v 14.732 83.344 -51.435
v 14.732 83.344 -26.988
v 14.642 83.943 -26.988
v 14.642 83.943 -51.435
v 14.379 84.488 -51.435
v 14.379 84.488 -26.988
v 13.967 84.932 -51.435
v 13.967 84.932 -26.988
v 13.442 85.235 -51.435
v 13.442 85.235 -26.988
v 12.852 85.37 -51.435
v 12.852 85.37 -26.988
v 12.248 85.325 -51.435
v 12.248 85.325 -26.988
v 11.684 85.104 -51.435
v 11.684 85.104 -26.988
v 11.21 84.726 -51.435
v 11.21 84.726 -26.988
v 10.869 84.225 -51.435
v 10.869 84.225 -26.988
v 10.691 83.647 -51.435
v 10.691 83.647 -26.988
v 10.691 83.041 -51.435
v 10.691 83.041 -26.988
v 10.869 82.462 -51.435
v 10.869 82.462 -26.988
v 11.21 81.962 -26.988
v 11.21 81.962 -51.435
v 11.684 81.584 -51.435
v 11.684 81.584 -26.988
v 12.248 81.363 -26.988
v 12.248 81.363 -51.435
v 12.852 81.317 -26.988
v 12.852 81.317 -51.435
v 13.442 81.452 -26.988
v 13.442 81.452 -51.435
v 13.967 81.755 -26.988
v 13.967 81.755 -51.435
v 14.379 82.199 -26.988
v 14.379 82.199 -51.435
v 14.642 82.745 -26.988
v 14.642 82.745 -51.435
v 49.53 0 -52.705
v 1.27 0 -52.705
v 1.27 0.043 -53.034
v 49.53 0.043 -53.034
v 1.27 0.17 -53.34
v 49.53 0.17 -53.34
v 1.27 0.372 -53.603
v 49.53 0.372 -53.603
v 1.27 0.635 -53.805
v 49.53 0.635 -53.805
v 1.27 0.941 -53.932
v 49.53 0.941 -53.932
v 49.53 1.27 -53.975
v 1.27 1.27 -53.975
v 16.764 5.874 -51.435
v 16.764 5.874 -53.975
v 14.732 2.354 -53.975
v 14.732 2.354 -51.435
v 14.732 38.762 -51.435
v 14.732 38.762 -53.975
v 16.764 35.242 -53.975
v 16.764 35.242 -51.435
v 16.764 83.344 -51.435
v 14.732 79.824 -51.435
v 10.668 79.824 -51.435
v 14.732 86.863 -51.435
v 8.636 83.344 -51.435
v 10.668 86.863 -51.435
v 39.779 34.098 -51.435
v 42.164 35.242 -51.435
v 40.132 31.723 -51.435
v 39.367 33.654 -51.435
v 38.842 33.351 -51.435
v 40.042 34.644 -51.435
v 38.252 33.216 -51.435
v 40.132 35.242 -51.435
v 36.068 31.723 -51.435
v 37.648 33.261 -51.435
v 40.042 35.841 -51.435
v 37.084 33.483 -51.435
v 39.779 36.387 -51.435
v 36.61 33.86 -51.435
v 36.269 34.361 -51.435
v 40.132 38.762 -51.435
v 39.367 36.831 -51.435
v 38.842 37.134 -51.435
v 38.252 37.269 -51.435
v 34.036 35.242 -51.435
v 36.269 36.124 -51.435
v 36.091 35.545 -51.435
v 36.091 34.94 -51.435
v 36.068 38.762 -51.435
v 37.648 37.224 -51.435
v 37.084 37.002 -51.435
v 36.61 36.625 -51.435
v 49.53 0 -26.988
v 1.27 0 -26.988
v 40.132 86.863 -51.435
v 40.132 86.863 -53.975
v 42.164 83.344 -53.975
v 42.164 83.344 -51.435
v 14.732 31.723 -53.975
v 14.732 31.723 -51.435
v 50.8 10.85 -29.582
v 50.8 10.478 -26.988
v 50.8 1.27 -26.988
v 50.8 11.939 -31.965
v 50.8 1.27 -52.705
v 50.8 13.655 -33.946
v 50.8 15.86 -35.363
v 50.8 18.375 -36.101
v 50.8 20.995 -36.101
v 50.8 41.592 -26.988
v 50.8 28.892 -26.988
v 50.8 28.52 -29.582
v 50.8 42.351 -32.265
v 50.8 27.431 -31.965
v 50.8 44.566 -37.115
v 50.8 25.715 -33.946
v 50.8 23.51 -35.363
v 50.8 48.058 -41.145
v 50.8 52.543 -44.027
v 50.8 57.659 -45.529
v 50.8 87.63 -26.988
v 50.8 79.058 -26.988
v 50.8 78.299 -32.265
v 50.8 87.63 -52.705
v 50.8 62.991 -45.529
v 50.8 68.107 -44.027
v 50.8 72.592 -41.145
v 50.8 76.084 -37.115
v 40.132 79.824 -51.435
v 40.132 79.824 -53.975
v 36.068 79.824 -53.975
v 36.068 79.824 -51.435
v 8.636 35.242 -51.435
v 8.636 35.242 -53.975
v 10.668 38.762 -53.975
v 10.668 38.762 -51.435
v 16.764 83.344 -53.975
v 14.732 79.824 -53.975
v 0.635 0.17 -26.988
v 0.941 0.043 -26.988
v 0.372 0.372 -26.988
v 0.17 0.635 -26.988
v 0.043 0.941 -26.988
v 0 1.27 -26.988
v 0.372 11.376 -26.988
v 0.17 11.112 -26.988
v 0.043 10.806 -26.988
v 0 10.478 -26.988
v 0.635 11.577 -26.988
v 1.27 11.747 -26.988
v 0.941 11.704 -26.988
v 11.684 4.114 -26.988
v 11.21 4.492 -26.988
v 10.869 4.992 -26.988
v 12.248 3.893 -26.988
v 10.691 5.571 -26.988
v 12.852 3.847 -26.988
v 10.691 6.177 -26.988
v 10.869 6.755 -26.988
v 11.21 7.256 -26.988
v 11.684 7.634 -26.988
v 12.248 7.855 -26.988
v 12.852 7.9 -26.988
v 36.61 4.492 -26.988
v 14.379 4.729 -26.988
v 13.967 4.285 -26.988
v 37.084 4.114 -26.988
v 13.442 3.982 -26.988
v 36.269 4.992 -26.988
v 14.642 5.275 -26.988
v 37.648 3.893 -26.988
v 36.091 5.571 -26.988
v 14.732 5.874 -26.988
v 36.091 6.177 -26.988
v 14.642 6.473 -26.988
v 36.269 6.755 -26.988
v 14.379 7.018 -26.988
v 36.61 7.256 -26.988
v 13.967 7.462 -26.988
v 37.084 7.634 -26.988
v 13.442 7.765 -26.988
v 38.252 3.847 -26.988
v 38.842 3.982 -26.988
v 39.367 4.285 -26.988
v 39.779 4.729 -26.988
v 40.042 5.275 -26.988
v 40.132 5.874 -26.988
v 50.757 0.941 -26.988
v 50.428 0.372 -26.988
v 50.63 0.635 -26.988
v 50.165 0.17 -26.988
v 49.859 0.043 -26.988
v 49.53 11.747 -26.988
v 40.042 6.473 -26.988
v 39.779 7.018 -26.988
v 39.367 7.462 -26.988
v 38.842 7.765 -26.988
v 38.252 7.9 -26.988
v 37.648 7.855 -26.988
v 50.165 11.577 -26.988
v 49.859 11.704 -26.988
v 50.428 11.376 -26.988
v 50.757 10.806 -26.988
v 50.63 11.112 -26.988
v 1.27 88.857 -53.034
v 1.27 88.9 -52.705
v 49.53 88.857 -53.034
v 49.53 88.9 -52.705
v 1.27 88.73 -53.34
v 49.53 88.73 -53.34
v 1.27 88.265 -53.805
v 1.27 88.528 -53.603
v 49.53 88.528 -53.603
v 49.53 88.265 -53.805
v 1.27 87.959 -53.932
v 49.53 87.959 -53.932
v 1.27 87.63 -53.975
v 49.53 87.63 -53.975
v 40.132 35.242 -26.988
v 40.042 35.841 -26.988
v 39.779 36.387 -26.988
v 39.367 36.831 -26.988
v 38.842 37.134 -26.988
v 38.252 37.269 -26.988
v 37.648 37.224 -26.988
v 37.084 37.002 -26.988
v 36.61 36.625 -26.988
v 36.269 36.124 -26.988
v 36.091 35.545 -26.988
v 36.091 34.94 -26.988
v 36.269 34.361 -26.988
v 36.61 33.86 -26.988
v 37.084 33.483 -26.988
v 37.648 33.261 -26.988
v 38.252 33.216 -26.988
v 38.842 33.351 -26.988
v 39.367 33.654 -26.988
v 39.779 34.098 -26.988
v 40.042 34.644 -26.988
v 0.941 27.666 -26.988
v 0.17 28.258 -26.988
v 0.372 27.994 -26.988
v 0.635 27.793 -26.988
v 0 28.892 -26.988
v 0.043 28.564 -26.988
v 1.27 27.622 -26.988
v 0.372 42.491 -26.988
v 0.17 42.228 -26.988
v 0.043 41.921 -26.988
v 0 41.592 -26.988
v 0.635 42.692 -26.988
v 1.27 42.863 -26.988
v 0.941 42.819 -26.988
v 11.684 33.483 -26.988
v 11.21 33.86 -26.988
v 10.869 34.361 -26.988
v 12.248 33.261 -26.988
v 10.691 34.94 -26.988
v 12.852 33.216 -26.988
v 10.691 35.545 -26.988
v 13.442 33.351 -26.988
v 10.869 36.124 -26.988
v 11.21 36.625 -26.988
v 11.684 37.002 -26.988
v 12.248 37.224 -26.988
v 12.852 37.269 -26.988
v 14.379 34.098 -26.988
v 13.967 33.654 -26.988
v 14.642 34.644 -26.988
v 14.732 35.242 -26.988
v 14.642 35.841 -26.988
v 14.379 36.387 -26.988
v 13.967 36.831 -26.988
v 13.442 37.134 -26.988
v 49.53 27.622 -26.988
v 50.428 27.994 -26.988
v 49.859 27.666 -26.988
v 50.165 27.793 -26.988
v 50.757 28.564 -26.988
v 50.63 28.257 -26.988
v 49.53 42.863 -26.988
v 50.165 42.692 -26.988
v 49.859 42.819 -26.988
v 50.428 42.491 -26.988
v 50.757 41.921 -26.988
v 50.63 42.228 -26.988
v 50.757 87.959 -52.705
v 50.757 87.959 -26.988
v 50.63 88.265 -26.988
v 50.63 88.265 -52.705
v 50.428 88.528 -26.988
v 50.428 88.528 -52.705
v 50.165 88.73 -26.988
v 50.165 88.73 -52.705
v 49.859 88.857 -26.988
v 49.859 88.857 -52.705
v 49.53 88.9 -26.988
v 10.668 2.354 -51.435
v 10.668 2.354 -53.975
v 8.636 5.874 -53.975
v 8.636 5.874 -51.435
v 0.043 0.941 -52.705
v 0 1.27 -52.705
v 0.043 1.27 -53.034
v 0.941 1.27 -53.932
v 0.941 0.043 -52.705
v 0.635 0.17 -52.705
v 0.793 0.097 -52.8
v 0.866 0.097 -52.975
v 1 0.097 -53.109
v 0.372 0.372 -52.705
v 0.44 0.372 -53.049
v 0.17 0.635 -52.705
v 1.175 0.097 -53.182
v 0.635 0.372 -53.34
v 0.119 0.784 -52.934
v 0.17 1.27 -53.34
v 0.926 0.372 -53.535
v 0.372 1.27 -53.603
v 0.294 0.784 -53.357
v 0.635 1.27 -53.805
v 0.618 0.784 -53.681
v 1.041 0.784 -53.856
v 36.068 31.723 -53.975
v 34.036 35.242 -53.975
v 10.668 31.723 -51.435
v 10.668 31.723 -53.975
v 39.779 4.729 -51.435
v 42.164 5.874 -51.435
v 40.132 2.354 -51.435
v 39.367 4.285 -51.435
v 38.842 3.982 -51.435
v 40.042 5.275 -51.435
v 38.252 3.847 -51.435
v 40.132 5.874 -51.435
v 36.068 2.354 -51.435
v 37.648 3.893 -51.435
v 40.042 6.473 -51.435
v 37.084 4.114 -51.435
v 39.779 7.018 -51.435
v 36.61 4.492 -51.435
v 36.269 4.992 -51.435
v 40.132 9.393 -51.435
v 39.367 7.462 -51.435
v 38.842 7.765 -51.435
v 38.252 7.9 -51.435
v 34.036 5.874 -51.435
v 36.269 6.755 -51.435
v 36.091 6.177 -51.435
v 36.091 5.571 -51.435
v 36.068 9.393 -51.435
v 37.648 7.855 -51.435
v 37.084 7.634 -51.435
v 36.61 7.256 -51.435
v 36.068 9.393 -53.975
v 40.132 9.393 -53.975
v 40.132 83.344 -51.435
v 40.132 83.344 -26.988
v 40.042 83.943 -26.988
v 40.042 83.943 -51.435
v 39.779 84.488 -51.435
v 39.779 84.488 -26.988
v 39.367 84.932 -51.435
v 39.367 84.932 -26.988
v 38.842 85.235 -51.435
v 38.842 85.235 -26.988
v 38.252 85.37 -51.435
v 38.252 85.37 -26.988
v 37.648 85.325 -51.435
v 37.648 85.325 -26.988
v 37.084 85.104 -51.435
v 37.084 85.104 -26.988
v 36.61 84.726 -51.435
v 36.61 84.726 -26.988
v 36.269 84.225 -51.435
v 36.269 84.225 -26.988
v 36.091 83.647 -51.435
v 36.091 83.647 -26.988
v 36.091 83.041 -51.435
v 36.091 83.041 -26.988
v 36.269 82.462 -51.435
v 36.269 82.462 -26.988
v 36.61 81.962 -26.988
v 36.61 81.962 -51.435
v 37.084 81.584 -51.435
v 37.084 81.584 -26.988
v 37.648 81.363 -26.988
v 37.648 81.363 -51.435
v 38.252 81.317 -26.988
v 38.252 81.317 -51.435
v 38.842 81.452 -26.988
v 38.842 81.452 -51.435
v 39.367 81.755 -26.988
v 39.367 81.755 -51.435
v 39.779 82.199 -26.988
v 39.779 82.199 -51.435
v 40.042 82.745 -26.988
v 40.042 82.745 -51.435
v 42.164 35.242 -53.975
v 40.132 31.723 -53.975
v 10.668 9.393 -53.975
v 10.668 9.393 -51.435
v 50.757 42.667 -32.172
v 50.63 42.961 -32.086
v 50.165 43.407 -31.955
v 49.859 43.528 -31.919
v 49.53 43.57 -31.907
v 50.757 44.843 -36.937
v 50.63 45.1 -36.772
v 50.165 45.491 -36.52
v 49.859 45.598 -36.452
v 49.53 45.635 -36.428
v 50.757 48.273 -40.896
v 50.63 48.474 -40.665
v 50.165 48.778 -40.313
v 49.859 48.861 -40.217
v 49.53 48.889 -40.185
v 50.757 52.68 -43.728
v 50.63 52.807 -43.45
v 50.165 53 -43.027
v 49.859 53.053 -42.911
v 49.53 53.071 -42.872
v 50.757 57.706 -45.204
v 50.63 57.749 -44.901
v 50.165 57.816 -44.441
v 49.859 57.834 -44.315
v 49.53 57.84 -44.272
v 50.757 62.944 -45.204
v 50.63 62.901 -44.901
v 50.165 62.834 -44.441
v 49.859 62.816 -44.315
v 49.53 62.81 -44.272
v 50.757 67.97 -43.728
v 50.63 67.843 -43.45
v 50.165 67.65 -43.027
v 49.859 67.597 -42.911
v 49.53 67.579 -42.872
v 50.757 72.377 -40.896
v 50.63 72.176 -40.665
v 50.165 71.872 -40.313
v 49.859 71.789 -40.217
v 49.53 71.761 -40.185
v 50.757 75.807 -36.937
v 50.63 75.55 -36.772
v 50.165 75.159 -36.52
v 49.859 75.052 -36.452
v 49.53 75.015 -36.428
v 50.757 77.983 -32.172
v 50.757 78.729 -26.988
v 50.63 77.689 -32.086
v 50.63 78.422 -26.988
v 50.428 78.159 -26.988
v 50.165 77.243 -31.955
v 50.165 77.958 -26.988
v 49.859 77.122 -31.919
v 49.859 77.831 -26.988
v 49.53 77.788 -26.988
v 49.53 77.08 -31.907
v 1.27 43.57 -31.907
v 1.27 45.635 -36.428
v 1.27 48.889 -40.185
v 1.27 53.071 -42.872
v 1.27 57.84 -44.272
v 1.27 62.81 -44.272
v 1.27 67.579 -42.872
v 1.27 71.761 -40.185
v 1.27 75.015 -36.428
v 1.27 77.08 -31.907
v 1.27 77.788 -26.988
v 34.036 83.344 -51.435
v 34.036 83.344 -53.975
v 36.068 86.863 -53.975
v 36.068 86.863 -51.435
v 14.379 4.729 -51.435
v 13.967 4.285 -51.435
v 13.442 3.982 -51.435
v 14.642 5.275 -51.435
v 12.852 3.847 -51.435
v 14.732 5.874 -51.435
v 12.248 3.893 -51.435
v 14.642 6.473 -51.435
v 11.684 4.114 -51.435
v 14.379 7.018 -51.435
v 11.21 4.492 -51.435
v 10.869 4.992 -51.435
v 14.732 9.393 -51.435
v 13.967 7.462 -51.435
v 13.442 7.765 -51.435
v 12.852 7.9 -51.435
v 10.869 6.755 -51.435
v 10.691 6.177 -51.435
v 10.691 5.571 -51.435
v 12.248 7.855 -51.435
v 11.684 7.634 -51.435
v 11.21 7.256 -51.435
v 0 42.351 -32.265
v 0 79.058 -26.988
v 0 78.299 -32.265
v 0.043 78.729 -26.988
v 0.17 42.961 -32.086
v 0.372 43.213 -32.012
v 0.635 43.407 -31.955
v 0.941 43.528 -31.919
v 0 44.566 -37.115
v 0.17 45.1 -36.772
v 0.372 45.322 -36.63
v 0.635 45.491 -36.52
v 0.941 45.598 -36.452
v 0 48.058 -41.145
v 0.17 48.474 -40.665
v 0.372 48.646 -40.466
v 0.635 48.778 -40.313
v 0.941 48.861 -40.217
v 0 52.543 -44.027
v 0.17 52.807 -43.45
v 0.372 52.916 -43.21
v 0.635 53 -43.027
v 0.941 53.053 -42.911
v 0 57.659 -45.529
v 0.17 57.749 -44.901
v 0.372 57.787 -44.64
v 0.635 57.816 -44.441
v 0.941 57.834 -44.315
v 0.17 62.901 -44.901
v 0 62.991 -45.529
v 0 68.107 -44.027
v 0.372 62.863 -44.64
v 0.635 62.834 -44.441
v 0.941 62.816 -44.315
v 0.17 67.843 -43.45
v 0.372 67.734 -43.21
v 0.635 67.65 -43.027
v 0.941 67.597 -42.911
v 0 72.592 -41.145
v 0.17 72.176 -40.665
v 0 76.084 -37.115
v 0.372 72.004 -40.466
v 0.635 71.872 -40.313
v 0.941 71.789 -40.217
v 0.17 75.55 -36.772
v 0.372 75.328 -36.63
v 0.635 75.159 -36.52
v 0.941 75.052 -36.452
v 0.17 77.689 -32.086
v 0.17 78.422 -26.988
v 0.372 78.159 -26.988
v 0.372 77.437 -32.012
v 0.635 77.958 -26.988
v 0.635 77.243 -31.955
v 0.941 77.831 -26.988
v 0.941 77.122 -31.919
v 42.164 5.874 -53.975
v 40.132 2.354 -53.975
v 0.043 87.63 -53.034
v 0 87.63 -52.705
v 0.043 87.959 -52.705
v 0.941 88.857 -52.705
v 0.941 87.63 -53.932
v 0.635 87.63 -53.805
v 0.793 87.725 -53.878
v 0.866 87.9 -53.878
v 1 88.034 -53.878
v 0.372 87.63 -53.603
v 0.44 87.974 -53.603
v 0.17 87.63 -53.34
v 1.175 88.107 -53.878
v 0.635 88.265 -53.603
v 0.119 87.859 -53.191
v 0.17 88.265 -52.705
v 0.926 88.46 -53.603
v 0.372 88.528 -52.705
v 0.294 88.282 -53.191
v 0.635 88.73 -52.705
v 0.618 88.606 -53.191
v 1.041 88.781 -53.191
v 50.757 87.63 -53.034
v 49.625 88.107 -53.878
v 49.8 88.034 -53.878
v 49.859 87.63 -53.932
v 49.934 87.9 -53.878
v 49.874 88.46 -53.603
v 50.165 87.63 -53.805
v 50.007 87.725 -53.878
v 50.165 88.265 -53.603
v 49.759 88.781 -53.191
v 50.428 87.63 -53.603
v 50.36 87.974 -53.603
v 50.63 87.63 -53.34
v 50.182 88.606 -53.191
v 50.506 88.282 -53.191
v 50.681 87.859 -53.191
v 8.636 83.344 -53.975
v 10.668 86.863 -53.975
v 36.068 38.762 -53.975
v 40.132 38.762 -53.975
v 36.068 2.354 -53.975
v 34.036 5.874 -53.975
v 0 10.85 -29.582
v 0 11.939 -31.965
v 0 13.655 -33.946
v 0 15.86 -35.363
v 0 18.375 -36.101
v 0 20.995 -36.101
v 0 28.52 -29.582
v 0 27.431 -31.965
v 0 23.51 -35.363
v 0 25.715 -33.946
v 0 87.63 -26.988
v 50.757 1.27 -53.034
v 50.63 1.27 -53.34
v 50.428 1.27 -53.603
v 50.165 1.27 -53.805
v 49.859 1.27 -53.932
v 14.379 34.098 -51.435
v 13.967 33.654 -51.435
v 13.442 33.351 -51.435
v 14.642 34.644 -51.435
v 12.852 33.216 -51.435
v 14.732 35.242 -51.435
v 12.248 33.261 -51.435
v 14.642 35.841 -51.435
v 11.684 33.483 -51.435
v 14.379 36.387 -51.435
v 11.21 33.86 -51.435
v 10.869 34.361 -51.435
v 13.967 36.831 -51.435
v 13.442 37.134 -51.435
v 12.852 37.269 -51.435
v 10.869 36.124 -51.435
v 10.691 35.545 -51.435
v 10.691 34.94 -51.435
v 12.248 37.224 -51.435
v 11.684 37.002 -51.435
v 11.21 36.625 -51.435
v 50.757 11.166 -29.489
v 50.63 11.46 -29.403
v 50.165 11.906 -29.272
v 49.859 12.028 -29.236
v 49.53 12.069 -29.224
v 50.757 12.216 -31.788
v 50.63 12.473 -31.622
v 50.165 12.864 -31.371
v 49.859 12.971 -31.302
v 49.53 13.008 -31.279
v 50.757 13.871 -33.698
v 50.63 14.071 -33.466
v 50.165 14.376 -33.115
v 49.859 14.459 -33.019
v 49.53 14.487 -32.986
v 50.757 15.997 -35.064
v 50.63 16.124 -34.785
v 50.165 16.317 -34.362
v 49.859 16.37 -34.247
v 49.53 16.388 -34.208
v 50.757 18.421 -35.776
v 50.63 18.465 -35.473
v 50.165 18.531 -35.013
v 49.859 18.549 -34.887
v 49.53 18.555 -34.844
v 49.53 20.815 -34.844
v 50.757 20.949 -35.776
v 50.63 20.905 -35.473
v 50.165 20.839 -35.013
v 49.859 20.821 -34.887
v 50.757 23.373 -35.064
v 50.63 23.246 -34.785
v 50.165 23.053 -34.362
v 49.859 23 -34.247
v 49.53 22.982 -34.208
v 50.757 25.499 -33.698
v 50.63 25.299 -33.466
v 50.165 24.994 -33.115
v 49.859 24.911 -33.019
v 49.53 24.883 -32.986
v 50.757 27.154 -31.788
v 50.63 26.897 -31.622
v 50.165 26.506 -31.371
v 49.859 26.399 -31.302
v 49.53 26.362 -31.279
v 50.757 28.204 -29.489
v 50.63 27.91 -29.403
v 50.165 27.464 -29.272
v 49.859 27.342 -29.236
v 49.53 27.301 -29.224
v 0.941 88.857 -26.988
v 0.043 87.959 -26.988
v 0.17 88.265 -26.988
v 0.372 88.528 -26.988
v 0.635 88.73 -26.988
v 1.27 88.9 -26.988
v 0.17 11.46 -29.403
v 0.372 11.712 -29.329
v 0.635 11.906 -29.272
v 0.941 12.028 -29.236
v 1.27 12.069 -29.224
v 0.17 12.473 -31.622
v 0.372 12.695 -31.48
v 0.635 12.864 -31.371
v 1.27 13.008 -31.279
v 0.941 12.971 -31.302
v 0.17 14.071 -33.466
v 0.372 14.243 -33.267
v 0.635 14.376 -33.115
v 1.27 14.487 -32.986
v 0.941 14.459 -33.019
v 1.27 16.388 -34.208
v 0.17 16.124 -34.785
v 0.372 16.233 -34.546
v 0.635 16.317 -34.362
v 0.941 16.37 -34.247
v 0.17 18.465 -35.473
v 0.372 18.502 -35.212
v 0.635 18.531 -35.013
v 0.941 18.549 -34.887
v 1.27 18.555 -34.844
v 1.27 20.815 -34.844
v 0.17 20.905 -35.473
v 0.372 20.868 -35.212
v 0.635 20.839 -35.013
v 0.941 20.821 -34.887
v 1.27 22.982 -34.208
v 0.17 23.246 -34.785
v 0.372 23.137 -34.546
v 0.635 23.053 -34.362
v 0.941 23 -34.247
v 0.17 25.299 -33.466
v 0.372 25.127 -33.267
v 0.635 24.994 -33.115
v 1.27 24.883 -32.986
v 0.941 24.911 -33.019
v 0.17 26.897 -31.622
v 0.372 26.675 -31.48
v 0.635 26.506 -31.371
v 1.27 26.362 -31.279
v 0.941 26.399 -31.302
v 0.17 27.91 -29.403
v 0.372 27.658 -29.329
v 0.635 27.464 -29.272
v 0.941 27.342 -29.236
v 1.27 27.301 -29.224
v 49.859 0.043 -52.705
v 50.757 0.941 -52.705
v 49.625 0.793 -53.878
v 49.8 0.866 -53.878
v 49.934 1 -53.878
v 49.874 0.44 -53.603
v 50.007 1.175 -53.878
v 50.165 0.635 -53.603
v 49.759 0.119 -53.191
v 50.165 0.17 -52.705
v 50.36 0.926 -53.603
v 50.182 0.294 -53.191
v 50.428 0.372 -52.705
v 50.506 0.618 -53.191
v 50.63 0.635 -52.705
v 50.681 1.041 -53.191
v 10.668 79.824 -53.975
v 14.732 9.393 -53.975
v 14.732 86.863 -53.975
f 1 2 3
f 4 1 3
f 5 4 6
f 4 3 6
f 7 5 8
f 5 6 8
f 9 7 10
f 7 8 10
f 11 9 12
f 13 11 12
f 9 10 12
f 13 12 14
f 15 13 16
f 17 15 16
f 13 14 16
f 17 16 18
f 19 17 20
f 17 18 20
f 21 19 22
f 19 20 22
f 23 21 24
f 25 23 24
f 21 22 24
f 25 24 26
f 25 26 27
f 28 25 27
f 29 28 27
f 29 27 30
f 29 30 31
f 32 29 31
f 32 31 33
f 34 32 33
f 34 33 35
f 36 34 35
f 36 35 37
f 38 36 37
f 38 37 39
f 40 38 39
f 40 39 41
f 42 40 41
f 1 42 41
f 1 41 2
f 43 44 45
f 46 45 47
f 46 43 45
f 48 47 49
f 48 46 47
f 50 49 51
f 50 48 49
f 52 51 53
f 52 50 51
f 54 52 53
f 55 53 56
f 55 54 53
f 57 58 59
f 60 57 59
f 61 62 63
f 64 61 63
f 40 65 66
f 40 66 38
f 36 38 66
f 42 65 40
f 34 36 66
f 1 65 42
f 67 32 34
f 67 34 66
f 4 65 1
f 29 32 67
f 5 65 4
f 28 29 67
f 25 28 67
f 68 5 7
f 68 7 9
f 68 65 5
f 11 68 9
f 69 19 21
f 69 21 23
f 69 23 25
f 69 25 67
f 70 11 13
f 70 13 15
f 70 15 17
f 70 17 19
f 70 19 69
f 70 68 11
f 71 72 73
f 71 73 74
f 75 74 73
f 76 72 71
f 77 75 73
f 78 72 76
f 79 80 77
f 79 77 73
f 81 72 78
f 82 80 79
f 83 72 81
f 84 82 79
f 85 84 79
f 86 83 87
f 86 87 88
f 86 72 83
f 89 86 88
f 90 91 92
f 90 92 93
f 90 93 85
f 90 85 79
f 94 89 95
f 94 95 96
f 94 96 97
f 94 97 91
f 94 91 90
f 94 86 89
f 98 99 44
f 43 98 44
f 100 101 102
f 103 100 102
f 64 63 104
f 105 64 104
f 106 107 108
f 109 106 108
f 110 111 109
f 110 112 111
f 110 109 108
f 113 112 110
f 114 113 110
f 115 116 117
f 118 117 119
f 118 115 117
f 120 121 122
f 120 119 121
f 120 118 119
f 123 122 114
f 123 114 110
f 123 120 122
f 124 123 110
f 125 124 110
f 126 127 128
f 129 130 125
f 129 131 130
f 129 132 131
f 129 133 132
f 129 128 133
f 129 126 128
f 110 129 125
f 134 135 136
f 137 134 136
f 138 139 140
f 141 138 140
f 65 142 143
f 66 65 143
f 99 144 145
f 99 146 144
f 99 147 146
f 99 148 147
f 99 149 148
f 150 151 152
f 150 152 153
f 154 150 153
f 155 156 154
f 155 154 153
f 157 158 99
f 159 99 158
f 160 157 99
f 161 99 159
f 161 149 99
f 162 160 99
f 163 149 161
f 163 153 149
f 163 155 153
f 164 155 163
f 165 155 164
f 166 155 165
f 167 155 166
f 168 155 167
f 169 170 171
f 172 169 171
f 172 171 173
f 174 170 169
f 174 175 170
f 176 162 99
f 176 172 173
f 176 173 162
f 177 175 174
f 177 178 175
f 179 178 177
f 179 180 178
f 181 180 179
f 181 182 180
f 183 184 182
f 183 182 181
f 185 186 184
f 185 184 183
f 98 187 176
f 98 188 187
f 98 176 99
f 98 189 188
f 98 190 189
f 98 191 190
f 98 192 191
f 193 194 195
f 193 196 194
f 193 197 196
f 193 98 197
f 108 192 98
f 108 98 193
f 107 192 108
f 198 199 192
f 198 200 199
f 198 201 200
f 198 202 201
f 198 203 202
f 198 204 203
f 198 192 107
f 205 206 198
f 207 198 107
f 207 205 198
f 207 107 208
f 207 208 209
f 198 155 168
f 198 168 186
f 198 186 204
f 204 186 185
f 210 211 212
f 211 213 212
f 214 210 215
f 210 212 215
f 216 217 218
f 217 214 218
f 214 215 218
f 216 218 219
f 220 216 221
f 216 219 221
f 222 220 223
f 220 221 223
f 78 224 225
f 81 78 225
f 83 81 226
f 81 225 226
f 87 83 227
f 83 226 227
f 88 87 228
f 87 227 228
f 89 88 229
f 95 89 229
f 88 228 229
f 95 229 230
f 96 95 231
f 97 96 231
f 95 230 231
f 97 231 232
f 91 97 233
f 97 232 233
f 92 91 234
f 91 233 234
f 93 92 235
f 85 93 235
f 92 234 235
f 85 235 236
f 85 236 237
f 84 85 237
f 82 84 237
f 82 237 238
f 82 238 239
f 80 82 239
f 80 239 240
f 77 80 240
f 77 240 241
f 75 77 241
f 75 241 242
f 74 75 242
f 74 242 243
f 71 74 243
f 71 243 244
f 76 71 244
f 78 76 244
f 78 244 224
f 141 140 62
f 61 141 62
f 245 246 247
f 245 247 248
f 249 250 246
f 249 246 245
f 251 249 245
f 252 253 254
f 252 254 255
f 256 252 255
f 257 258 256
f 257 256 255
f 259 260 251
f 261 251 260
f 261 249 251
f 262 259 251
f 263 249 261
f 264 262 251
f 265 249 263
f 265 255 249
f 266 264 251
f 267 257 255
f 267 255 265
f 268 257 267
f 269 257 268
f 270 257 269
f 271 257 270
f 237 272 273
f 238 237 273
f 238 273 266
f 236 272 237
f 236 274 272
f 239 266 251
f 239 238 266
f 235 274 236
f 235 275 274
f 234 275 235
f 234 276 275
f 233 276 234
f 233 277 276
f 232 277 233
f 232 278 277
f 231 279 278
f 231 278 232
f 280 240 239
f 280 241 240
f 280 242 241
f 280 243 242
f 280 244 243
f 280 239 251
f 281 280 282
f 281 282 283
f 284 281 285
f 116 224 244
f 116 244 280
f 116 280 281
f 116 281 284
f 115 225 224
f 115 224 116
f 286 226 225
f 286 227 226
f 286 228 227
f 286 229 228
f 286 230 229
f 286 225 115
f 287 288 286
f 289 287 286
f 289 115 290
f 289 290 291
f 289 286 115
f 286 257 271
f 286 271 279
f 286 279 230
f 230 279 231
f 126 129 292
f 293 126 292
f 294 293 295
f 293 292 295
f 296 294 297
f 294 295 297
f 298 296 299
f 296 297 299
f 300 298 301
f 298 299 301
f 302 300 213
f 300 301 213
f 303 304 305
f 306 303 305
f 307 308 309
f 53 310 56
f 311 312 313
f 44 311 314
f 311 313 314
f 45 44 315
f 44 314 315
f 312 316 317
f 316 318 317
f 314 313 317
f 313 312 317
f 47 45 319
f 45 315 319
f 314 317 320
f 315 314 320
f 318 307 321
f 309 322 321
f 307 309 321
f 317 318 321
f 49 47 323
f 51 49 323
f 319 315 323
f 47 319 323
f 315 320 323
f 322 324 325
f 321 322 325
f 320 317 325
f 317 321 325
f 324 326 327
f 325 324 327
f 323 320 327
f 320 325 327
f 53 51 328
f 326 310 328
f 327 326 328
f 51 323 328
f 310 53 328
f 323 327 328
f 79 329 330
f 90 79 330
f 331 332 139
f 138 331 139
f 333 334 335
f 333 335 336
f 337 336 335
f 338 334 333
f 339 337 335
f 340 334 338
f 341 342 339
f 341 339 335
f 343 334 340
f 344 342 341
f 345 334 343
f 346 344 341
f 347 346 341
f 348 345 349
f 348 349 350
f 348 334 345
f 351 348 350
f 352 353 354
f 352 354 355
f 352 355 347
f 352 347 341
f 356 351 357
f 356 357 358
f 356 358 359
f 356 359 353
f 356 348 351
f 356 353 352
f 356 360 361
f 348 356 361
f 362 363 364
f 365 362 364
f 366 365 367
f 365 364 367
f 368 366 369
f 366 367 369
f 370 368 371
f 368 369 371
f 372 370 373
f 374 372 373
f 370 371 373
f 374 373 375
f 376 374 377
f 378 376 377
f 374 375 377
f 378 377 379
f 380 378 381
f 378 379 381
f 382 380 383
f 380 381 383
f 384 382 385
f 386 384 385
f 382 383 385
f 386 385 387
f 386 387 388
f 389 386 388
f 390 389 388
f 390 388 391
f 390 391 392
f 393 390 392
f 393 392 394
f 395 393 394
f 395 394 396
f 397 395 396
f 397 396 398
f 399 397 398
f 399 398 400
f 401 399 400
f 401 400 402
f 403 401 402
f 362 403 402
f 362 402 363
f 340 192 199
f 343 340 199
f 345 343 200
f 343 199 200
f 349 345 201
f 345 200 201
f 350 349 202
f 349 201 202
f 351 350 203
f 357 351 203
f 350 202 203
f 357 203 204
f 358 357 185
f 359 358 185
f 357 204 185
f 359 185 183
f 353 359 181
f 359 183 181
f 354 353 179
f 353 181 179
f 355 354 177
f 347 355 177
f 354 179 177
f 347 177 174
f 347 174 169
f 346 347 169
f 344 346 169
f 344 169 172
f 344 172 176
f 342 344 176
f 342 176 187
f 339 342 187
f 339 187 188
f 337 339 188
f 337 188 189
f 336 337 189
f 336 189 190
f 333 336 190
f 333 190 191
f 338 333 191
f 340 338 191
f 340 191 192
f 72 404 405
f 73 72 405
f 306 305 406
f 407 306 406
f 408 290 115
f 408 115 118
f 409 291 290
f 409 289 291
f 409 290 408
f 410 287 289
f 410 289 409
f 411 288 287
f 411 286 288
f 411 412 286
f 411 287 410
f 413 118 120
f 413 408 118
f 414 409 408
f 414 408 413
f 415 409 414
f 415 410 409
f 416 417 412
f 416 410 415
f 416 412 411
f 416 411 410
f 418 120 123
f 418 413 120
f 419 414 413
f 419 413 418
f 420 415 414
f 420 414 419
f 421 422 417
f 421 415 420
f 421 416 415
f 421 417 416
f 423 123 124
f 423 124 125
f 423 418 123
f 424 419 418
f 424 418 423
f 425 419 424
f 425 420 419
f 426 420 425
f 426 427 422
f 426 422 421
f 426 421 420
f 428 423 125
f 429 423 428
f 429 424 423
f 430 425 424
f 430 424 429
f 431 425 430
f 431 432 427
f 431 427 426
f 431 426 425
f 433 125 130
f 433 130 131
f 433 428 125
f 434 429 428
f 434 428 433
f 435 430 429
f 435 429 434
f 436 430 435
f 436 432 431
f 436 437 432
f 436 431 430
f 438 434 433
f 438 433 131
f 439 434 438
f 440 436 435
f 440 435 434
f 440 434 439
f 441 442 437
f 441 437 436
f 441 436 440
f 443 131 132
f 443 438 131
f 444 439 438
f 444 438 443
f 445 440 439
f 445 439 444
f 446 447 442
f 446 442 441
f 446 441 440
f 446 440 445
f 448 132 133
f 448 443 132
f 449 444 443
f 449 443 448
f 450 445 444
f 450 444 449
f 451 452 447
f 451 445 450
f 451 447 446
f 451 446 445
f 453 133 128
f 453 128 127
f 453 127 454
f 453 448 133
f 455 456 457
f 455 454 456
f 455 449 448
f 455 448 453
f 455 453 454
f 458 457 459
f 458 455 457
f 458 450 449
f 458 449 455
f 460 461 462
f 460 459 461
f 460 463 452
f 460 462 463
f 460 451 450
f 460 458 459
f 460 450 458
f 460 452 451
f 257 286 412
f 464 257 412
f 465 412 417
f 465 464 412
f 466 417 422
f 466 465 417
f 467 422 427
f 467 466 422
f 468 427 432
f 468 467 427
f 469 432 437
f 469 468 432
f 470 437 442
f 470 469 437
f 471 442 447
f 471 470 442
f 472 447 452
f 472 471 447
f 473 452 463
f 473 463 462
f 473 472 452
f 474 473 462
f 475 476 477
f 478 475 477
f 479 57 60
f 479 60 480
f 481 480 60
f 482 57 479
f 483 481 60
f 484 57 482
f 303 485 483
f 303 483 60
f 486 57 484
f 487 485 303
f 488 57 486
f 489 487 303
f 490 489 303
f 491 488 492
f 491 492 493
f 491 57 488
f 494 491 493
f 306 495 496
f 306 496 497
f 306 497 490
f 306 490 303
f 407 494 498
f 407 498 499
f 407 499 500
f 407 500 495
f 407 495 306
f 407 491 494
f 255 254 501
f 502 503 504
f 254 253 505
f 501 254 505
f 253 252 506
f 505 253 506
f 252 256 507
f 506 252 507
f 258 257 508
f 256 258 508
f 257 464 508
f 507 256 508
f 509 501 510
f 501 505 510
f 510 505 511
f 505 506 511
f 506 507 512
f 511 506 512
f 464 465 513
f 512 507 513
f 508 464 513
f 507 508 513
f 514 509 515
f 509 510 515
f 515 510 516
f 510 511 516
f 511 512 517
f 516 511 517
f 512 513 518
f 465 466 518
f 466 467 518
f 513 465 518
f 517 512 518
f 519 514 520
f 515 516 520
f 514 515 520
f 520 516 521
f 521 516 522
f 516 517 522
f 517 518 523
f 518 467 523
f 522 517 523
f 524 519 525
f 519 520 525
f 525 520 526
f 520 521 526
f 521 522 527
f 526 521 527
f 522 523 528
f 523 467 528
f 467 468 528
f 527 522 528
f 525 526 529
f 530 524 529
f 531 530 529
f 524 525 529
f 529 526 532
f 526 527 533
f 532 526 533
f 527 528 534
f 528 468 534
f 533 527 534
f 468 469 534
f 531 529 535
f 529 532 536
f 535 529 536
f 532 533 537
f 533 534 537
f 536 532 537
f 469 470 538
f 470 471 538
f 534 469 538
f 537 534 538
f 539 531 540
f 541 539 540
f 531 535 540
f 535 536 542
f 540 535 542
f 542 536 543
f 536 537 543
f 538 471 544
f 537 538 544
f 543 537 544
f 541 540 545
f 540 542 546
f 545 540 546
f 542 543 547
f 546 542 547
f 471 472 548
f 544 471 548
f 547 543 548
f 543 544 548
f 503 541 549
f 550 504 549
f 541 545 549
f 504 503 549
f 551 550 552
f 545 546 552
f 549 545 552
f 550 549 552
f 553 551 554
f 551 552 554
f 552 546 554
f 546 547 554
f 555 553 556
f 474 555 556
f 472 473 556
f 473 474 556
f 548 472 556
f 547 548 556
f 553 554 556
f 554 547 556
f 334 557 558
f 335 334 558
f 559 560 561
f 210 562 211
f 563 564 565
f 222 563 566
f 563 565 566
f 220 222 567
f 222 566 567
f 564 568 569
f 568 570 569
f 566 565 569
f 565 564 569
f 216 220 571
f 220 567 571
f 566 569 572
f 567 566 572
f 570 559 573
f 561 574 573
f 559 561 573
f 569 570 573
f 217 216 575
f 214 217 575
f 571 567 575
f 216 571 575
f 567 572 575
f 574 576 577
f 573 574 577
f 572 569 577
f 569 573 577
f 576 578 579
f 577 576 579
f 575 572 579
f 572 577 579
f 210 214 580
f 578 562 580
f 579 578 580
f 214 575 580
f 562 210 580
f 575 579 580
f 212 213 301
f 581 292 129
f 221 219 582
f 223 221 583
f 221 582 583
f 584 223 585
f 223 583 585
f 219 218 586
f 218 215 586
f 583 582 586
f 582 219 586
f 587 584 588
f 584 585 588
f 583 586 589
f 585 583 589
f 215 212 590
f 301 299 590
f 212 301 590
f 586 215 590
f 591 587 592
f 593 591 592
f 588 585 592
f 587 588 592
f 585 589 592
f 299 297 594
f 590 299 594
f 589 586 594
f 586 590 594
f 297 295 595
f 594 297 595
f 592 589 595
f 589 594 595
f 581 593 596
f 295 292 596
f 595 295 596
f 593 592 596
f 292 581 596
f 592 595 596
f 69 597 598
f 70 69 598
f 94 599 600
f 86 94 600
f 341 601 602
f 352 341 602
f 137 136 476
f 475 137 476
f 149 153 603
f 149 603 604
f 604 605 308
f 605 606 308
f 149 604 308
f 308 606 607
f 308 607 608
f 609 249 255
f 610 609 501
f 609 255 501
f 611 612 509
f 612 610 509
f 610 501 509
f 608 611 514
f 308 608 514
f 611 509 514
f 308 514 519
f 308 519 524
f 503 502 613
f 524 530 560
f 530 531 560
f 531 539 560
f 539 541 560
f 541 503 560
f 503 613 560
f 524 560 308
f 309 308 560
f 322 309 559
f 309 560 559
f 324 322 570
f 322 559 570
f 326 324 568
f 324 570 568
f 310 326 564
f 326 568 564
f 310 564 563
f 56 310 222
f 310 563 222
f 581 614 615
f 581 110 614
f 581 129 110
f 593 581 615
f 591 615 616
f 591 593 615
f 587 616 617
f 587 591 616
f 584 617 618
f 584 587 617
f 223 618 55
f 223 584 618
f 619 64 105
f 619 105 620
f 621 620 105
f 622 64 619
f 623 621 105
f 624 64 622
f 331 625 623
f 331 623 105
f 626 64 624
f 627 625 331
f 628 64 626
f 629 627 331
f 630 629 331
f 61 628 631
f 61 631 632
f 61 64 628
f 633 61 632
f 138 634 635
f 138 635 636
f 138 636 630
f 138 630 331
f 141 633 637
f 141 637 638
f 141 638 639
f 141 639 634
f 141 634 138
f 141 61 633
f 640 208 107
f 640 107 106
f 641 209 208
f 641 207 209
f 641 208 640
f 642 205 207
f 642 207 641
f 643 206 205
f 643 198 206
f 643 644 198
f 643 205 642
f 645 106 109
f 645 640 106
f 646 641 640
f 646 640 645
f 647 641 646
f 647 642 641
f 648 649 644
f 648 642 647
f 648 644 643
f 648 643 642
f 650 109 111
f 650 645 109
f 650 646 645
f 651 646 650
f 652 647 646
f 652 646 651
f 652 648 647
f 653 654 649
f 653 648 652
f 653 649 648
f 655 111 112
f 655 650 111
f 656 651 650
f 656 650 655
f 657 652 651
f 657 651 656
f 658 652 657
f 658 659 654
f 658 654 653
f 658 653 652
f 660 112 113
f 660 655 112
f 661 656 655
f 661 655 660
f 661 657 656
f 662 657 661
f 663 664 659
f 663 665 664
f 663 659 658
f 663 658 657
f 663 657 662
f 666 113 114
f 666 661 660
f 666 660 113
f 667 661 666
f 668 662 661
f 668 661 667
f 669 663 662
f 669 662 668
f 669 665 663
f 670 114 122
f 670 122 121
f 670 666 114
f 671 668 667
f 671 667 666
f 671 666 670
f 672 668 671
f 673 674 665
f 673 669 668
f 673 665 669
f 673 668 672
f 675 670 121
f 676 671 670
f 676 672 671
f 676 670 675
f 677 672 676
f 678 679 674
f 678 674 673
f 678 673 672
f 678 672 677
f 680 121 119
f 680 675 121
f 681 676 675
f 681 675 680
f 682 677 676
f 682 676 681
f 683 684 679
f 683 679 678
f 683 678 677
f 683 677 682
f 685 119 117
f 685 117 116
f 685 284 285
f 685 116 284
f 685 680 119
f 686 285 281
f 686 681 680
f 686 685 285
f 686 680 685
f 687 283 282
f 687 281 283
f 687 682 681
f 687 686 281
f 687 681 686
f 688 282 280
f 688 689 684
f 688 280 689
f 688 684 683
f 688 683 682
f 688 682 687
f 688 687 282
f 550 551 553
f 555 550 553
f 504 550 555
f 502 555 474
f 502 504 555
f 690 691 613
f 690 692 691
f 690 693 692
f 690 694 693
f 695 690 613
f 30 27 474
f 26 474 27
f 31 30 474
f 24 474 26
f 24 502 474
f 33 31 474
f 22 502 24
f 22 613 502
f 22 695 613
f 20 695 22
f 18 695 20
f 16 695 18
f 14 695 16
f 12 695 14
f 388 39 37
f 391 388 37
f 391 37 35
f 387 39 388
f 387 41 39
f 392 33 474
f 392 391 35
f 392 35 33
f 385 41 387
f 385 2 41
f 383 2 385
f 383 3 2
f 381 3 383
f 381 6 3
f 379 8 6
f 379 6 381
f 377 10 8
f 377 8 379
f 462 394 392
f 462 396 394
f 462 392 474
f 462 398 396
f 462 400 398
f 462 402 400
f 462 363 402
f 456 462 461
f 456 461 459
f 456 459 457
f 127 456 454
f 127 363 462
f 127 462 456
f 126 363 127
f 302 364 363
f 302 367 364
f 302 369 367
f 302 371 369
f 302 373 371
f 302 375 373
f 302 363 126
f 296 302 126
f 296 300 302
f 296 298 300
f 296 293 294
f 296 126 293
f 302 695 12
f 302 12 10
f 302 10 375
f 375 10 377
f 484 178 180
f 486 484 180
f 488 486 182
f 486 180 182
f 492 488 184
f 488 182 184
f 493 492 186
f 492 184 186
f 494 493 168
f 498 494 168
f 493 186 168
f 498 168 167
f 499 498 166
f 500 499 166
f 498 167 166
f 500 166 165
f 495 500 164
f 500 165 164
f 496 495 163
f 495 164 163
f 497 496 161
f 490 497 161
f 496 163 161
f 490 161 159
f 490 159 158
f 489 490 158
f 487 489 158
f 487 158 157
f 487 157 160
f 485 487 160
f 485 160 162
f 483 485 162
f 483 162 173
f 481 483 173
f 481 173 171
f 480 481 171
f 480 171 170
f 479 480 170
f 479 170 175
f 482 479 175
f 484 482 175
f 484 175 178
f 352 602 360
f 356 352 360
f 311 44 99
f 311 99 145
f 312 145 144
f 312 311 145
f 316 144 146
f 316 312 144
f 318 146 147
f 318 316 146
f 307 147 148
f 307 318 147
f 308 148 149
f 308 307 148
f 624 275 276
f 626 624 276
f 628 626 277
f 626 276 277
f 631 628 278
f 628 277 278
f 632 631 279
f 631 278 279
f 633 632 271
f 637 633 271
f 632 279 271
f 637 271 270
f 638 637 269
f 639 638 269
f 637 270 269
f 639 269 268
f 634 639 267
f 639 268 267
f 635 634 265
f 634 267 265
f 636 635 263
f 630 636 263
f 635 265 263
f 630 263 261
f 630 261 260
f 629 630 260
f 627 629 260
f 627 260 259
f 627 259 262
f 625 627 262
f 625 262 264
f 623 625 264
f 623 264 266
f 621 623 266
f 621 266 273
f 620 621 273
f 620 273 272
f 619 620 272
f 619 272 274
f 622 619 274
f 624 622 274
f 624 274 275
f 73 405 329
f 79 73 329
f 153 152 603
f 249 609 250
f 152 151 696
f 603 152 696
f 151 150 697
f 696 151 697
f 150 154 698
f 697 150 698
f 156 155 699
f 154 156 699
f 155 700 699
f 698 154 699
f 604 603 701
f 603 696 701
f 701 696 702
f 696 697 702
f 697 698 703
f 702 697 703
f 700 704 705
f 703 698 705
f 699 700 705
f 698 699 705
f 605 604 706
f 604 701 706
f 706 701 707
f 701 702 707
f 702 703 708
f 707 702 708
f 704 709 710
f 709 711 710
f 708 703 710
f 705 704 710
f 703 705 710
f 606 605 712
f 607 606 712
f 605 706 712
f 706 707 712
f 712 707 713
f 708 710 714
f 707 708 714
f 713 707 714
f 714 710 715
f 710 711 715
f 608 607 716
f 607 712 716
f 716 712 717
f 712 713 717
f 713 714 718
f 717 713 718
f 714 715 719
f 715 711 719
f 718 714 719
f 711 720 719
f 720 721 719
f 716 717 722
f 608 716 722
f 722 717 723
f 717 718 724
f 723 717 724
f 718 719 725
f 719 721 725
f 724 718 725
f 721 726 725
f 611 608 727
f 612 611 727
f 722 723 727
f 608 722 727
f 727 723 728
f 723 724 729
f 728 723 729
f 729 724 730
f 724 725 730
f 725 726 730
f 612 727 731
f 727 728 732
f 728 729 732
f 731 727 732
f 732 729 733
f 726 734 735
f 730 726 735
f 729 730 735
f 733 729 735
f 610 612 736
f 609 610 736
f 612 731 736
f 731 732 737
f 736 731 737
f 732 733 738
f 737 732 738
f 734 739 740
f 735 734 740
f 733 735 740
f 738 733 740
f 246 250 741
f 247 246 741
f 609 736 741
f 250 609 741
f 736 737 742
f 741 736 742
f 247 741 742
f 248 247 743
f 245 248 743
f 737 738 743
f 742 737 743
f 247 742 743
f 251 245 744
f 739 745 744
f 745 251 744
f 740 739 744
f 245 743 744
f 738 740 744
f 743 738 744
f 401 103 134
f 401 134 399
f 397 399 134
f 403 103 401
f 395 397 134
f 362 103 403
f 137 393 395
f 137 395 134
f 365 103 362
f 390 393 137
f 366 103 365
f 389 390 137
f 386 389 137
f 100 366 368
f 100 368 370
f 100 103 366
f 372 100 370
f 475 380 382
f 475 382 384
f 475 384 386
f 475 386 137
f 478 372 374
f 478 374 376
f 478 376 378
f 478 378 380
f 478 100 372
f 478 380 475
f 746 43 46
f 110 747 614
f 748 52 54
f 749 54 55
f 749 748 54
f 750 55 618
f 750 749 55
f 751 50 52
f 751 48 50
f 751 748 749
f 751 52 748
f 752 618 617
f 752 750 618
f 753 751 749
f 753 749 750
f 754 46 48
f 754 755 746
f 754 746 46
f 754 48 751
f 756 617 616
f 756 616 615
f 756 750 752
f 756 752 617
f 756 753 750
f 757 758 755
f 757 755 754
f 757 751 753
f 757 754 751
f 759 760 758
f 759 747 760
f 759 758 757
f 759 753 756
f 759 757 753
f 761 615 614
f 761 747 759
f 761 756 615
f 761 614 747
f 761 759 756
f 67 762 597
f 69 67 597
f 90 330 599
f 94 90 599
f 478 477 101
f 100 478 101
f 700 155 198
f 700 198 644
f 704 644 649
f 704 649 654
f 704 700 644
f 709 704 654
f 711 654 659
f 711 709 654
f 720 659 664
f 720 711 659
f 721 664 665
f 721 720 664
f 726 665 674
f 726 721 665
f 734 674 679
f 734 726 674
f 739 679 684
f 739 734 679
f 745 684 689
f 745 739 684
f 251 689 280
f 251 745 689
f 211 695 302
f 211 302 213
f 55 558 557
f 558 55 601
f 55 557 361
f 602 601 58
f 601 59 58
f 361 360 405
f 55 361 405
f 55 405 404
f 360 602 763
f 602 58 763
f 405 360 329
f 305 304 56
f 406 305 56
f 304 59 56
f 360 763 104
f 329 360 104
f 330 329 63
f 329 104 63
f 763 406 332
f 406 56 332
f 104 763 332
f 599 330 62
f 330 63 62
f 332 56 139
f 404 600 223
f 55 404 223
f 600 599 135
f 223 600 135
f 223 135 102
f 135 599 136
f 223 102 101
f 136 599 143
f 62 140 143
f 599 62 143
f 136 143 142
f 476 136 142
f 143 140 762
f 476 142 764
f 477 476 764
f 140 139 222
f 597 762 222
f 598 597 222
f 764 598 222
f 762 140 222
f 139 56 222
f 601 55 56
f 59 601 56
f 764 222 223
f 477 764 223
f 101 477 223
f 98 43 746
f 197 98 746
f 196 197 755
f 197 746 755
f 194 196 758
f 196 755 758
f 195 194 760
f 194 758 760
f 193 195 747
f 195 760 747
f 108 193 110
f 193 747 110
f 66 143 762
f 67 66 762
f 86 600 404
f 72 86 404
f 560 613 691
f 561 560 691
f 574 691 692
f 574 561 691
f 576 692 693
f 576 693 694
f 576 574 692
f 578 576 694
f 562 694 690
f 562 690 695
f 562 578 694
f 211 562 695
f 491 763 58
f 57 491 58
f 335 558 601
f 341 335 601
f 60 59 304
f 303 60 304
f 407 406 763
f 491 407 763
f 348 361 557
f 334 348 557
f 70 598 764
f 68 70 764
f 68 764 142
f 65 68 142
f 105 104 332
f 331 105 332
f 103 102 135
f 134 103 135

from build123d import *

# Parameters (mm, degrees)
SKETCH1_W           = 53.975
SKETCH1_H           = 88.9
SKETCH1_R           = 7.9375
SKETCH1_R_2         = 17.4625
BOSS_EXTRUDE1_DEPTH = 50.8
SKETCH5_R           = 2.032
CUT_EXTRUDE1_DEPTH  = 116.746060948
SKETCH5_3_R         = 3.5
CUT_EXTRUDE2_DEPTH  = 4.064
CUT_EXTRUDE3_DEPTH  = 2.54
FILLET1_R           = 1.27


with BuildPart() as part:
    # Sketch1 → Boss-Extrude1 (new body)
    with BuildSketch(Plane(origin=(0, 0, 0), x_dir=(0, 0, -1), z_dir=(1, 0, 0))):
        with Locations((26.9875, 44.45)):
            Rectangle(SKETCH1_W, SKETCH1_H)
        with Locations(Location((26.9875, 19.685, 0), (0, 0, 180))):
            Circle(SKETCH1_R, mode=Mode.SUBTRACT)
        with Locations(Location((26.9875, 60.325, 0), (0, 0, 180))):
            Circle(SKETCH1_R_2, mode=Mode.SUBTRACT)
    extrude(amount=BOSS_EXTRUDE1_DEPTH)

    # Sketch5 → Cut-Extrude1 (cut, through all)
    with BuildSketch(Plane.XY):
        with Locations((12.7, 83.34375)):
            Circle(SKETCH5_R)
        with Locations((12.7, 35.2425)):
            Circle(SKETCH5_R)
        with Locations((38.1, 83.34375)):
            Circle(SKETCH5_R)
        with Locations((38.1, 35.2425)):
            Circle(SKETCH5_R)
        with Locations((12.7, 5.87375)):
            Circle(SKETCH5_R)
        with Locations((38.1, 5.87375)):
            Circle(SKETCH5_R)
    extrude(amount=-CUT_EXTRUDE1_DEPTH, mode=Mode.SUBTRACT)

    # Sketch5<3> → Cut-Extrude2 (cut)
    with BuildSketch(Plane.XY):
        with Locations((38.1, 35.2425)):
            Circle(SKETCH5_3_R)
        with Locations((12.7, 83.34375)):
            Circle(SKETCH5_3_R)
        with Locations((38.1, 83.34375)):
            Circle(SKETCH5_3_R)
        with Locations((12.7, 35.2425)):
            Circle(SKETCH5_3_R)
        with Locations((38.1, 5.87375)):
            Circle(SKETCH5_3_R)
        with Locations((12.7, 5.87375)):
            Circle(SKETCH5_3_R)
    extrude(amount=-CUT_EXTRUDE2_DEPTH, mode=Mode.SUBTRACT)

    # Sketch6 → Cut-Extrude3 (cut)
    with BuildSketch(Plane(origin=(0, 0, -53.975), x_dir=(-1, 0, 0), z_dir=(0, 0, -1))):
        Polygon((-8.636, 83.34375), (-10.668, 86.863277241), (-14.732, 86.863277241), (-16.764, 83.34375), (-14.732, 79.824222759), (-10.668, 79.824222759), align=None)
        Polygon((-34.036, 83.34375), (-36.068, 86.863277241), (-40.132, 86.863277241), (-42.164, 83.34375), (-40.132, 79.824222759), (-36.068, 79.824222759), align=None)
        Polygon((-34.036, 35.2425), (-36.068, 38.762027241), (-40.132, 38.762027241), (-42.164, 35.2425), (-40.132, 31.722972759), (-36.068, 31.722972759), align=None)
        Polygon((-8.636, 35.2425), (-10.668, 38.762027241), (-14.732, 38.762027241), (-16.764, 35.2425), (-14.732, 31.722972759), (-10.668, 31.722972759), align=None)
        Polygon((-8.636, 5.87375), (-10.668, 9.393277241), (-14.732, 9.393277241), (-16.764, 5.87375), (-14.732, 2.354222759), (-10.668, 2.354222759), align=None)
        Polygon((-34.036, 5.87375), (-36.068, 9.393277241), (-40.132, 9.393277241), (-42.164, 5.87375), (-40.132, 2.354222759), (-36.068, 2.354222759), align=None)
    extrude(amount=-CUT_EXTRUDE3_DEPTH, mode=Mode.SUBTRACT)

    # Fillet1
    fillet1_edges = [part.edges().sort_by_distance(p)[0] for p in [
        (0, 60.325, -44.45),
        (50.8, 60.325, -44.45),
        (50.8, 88.9, -26.9875),
        (0, 19.685, -34.925),
        (50.8, 19.685, -34.925),
        (50.8, 44.45, 0),
        (50.8, 0, -26.9875),
        (0, 44.45, 0),
        (0, 88.9, -26.9875),
        (0, 44.45, -53.975),
        (0, 0, -26.9875),
        (25.4, 0, 0),
        (25.4, 88.9, 0),
        (25.4, 88.9, -53.975),
        (25.4, 0, -53.975),
        (50.8, 44.45, -53.975),
    ]]
    fillet(fillet1_edges, radius=FILLET1_R)

    # SurfaceCut1
    split(bisect_by=Plane.XY.offset(-26.9875), keep=Keep.BOTTOM)


solid = part.part
